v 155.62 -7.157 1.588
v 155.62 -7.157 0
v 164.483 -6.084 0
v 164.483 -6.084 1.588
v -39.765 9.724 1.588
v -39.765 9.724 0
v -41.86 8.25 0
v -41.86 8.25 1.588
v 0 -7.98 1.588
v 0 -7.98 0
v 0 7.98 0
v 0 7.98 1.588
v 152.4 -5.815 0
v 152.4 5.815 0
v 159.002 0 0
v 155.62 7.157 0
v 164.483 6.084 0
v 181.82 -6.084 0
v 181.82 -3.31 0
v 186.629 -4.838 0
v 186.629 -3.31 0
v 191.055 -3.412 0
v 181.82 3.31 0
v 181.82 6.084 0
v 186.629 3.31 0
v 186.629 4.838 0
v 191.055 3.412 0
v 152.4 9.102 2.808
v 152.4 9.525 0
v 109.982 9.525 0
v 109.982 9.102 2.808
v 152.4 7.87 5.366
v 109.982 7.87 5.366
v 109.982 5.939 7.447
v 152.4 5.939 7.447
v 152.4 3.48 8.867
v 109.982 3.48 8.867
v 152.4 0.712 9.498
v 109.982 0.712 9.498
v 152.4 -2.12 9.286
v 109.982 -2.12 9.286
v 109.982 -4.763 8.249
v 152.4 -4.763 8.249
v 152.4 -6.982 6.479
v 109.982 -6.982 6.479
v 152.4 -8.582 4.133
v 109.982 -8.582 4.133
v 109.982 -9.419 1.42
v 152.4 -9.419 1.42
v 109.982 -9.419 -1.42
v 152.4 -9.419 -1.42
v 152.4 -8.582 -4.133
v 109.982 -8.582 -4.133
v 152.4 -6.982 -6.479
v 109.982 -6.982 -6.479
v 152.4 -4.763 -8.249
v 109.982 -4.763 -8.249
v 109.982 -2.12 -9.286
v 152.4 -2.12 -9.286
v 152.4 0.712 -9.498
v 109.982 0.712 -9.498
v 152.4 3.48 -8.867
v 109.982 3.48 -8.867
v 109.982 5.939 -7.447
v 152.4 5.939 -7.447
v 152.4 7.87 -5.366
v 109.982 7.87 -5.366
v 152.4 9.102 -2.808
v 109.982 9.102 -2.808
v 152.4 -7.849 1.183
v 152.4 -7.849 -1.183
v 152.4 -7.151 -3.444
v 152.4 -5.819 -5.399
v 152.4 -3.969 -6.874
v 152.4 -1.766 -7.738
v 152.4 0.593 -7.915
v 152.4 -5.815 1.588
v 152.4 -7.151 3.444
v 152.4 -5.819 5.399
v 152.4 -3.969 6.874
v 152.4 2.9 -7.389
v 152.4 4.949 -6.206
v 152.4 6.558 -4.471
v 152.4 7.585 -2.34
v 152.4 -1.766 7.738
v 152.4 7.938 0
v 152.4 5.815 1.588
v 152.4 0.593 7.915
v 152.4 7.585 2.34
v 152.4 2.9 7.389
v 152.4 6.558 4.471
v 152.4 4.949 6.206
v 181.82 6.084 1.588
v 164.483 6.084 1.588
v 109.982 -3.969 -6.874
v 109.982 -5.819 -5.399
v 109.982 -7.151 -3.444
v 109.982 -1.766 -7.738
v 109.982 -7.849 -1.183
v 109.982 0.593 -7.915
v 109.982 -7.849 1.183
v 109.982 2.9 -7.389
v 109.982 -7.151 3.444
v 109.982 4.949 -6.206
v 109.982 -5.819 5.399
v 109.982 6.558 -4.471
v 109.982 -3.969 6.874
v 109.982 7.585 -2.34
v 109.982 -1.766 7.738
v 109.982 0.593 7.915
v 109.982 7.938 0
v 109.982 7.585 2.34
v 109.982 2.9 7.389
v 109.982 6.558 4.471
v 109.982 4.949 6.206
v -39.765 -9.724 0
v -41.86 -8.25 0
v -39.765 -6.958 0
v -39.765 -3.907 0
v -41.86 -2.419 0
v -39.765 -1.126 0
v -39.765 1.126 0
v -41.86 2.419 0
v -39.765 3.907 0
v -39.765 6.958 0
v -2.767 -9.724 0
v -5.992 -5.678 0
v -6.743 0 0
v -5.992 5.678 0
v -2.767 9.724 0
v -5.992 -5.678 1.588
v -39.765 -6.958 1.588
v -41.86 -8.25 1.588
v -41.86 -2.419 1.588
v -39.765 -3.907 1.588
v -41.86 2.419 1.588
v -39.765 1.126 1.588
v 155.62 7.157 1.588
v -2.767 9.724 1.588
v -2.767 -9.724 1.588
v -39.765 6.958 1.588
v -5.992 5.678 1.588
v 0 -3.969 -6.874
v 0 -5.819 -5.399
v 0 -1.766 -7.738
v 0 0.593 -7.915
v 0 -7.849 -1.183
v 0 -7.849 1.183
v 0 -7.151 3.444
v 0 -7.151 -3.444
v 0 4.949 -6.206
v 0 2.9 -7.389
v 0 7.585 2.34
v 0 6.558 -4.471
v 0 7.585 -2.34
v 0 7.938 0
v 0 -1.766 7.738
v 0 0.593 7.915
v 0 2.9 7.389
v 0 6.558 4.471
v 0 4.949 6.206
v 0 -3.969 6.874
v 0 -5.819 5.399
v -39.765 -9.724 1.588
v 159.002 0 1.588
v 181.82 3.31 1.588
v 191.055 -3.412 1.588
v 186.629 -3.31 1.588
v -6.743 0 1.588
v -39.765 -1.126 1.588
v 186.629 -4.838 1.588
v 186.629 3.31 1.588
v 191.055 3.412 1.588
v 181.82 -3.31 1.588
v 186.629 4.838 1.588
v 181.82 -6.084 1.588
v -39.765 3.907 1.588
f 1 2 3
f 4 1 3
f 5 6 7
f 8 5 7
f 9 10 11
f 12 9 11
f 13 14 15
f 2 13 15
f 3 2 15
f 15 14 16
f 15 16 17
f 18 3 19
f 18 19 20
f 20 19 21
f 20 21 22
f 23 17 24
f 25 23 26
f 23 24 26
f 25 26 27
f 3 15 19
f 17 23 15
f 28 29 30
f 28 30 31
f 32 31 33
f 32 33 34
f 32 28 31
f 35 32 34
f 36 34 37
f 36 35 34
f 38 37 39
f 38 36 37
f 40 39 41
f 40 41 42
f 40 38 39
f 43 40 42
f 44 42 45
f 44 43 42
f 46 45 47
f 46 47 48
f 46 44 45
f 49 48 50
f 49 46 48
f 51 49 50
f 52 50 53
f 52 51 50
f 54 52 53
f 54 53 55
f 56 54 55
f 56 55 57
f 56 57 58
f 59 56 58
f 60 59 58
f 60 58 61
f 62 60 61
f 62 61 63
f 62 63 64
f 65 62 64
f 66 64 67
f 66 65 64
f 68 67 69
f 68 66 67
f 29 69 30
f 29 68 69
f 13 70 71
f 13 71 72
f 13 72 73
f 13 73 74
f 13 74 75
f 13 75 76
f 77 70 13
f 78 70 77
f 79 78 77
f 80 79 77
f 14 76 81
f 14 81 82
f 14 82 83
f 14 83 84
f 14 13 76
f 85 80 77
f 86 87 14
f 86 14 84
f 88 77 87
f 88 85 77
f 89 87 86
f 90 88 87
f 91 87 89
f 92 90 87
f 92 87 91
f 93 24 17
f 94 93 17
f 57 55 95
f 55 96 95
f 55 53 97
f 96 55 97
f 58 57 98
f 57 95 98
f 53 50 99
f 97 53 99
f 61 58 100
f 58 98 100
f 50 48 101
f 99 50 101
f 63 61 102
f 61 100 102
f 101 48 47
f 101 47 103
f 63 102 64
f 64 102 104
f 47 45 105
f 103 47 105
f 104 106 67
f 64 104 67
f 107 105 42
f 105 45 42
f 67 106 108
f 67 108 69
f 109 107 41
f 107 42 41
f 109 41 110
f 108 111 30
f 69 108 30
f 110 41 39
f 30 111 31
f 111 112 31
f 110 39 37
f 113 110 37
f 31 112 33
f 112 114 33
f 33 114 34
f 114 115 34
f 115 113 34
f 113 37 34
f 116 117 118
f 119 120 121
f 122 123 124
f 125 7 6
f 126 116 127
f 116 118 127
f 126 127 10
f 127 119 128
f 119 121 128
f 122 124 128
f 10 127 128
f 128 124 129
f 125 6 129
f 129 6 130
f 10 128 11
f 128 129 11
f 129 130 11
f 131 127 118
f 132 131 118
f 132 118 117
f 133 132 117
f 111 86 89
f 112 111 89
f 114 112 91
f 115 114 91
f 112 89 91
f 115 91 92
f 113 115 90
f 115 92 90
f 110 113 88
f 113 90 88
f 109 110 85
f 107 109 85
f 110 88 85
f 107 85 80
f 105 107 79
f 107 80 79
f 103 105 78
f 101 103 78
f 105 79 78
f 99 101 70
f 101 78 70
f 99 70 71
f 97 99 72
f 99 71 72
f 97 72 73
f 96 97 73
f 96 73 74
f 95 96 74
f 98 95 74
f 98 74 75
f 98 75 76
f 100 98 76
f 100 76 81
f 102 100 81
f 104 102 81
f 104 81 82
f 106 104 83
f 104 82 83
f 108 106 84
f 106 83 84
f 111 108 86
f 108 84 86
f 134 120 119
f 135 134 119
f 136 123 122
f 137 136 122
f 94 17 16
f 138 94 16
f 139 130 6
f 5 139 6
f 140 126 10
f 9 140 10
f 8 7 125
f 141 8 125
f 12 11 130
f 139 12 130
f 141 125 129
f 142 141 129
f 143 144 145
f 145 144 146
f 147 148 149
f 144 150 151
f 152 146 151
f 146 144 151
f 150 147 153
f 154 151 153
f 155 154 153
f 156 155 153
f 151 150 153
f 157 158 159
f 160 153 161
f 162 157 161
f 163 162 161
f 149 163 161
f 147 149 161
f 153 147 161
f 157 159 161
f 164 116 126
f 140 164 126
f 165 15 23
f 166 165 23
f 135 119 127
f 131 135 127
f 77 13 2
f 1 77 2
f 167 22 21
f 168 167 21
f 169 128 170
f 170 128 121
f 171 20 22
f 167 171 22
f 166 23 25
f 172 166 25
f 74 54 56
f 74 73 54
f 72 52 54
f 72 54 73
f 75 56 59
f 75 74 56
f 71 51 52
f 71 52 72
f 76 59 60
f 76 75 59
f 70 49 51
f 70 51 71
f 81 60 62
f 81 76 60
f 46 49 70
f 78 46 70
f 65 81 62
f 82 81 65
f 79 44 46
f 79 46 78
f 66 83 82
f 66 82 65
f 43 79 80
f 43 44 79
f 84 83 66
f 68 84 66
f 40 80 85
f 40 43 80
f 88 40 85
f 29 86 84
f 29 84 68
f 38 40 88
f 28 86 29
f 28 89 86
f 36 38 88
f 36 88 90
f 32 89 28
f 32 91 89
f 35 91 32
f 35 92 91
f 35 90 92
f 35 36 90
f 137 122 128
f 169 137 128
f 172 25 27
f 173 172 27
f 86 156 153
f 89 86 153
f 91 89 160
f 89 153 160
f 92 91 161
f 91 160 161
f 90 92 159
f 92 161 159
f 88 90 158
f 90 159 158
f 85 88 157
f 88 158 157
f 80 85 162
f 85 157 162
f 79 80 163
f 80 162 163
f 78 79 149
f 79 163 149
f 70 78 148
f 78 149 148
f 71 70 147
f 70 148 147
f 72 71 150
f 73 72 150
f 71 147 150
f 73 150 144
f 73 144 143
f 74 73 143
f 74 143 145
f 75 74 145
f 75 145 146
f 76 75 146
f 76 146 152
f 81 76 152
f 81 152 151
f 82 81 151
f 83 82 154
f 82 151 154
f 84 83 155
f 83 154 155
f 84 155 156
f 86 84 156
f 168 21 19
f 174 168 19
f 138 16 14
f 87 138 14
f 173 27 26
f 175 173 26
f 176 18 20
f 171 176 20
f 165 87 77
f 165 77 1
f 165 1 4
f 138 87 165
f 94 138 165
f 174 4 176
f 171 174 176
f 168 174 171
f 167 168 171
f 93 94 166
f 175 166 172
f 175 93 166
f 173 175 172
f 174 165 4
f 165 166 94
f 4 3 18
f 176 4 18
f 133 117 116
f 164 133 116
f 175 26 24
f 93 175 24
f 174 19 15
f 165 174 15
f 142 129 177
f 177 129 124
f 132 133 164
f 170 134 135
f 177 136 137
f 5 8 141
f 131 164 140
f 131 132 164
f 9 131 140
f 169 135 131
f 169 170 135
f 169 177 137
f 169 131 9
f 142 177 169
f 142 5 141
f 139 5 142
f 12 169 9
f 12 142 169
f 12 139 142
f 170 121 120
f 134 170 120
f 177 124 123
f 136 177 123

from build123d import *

# Parameters (mm, degrees)
F0_R     = 7.9375
F1_DEPTH = 152.4
F3_DEPTH = 1.5875
F5_DEPTH = 1.5875
F6_R     = 9.525
F6_R_2   = 7.9375
F7_DEPTH = 42.418


# Not quite as in the source:
# - a length typed as a fraction of an inch, garbled in the dataset ("3 / 203.2 mm" for 3/8 in), is restored
# - a feature names something its author has since deleted; it is built from what else it names


with BuildPart() as f1:
    # F0 (on Right) → F1 (new body)
    with BuildSketch(Plane.YZ):
        Circle(F0_R)
    extrude(amount=F1_DEPTH)

    # F4 (on Top) → F5 (join)
    with BuildSketch(Plane.XY):
        Polygon((155.6199789047, 7.1569969878), (152.3619145155, 5.799469538), (152.3619145155, 0), (159.0015292168, 0), (181.8202883005, 3.309753025), (186.6287142038, 3.309753025), (191.0549998283, 3.4116455354), (186.6287142038, 4.8380969092), (181.8202883005, 6.0837985948), (164.4826829433, 6.0837985948), align=None)
        Polygon((159.0015292168, 0), (152.3619145155, 0), (152.3619145155, -5.799469538), (155.6199789047, -7.1569969878), (164.4826829433, -6.0837985948), (181.8202883005, -6.0837985948), (186.6287142038, -4.8380969092), (191.0549998283, -3.4116455354), (186.6287142038, -3.309753025), (181.8202883005, -3.309753025), align=None)
    extrude(amount=F5_DEPTH)


with BuildPart() as f3:
    # F2 (on Top) → F3 (new body)
    with BuildSketch(Plane.XY):
        Polygon((0, 0), (0, 7.9797012731), (-2.7672210486, 9.7242689653), (-39.7654250264, 9.7242689653), (-41.8596901, 8.250253275), (-39.7654250264, 6.9576832621), (-5.9918332845, 5.6780572049), (-39.7654250264, 3.907465376), (-41.8596901, 2.4189068936), (-39.7654250264, 1.1263368807), (-6.7428140901, 0), align=None)
        Polygon((0, -7.9797012731), (0, 0), (-6.7428140901, 0), (-39.7654250264, -1.1263368807), (-41.8596901, -2.4189068936), (-39.7654250264, -3.907465376), (-5.9918332845, -5.6780572049), (-39.7654250264, -6.9576832621), (-41.8596901, -8.250253275), (-39.7654250264, -9.7242689653), (-2.7672210486, -9.7242689653), align=None)
    extrude(amount=F3_DEPTH)


with BuildPart() as f7:
    # F6 (on face) → F7 (new body)
    with BuildSketch(Plane.YZ.offset(152.4)):
        Circle(F6_R)
        Circle(F6_R_2, mode=Mode.SUBTRACT)
    extrude(amount=-F7_DEPTH)


solid = Compound([f1.part, f3.part, f7.part])
